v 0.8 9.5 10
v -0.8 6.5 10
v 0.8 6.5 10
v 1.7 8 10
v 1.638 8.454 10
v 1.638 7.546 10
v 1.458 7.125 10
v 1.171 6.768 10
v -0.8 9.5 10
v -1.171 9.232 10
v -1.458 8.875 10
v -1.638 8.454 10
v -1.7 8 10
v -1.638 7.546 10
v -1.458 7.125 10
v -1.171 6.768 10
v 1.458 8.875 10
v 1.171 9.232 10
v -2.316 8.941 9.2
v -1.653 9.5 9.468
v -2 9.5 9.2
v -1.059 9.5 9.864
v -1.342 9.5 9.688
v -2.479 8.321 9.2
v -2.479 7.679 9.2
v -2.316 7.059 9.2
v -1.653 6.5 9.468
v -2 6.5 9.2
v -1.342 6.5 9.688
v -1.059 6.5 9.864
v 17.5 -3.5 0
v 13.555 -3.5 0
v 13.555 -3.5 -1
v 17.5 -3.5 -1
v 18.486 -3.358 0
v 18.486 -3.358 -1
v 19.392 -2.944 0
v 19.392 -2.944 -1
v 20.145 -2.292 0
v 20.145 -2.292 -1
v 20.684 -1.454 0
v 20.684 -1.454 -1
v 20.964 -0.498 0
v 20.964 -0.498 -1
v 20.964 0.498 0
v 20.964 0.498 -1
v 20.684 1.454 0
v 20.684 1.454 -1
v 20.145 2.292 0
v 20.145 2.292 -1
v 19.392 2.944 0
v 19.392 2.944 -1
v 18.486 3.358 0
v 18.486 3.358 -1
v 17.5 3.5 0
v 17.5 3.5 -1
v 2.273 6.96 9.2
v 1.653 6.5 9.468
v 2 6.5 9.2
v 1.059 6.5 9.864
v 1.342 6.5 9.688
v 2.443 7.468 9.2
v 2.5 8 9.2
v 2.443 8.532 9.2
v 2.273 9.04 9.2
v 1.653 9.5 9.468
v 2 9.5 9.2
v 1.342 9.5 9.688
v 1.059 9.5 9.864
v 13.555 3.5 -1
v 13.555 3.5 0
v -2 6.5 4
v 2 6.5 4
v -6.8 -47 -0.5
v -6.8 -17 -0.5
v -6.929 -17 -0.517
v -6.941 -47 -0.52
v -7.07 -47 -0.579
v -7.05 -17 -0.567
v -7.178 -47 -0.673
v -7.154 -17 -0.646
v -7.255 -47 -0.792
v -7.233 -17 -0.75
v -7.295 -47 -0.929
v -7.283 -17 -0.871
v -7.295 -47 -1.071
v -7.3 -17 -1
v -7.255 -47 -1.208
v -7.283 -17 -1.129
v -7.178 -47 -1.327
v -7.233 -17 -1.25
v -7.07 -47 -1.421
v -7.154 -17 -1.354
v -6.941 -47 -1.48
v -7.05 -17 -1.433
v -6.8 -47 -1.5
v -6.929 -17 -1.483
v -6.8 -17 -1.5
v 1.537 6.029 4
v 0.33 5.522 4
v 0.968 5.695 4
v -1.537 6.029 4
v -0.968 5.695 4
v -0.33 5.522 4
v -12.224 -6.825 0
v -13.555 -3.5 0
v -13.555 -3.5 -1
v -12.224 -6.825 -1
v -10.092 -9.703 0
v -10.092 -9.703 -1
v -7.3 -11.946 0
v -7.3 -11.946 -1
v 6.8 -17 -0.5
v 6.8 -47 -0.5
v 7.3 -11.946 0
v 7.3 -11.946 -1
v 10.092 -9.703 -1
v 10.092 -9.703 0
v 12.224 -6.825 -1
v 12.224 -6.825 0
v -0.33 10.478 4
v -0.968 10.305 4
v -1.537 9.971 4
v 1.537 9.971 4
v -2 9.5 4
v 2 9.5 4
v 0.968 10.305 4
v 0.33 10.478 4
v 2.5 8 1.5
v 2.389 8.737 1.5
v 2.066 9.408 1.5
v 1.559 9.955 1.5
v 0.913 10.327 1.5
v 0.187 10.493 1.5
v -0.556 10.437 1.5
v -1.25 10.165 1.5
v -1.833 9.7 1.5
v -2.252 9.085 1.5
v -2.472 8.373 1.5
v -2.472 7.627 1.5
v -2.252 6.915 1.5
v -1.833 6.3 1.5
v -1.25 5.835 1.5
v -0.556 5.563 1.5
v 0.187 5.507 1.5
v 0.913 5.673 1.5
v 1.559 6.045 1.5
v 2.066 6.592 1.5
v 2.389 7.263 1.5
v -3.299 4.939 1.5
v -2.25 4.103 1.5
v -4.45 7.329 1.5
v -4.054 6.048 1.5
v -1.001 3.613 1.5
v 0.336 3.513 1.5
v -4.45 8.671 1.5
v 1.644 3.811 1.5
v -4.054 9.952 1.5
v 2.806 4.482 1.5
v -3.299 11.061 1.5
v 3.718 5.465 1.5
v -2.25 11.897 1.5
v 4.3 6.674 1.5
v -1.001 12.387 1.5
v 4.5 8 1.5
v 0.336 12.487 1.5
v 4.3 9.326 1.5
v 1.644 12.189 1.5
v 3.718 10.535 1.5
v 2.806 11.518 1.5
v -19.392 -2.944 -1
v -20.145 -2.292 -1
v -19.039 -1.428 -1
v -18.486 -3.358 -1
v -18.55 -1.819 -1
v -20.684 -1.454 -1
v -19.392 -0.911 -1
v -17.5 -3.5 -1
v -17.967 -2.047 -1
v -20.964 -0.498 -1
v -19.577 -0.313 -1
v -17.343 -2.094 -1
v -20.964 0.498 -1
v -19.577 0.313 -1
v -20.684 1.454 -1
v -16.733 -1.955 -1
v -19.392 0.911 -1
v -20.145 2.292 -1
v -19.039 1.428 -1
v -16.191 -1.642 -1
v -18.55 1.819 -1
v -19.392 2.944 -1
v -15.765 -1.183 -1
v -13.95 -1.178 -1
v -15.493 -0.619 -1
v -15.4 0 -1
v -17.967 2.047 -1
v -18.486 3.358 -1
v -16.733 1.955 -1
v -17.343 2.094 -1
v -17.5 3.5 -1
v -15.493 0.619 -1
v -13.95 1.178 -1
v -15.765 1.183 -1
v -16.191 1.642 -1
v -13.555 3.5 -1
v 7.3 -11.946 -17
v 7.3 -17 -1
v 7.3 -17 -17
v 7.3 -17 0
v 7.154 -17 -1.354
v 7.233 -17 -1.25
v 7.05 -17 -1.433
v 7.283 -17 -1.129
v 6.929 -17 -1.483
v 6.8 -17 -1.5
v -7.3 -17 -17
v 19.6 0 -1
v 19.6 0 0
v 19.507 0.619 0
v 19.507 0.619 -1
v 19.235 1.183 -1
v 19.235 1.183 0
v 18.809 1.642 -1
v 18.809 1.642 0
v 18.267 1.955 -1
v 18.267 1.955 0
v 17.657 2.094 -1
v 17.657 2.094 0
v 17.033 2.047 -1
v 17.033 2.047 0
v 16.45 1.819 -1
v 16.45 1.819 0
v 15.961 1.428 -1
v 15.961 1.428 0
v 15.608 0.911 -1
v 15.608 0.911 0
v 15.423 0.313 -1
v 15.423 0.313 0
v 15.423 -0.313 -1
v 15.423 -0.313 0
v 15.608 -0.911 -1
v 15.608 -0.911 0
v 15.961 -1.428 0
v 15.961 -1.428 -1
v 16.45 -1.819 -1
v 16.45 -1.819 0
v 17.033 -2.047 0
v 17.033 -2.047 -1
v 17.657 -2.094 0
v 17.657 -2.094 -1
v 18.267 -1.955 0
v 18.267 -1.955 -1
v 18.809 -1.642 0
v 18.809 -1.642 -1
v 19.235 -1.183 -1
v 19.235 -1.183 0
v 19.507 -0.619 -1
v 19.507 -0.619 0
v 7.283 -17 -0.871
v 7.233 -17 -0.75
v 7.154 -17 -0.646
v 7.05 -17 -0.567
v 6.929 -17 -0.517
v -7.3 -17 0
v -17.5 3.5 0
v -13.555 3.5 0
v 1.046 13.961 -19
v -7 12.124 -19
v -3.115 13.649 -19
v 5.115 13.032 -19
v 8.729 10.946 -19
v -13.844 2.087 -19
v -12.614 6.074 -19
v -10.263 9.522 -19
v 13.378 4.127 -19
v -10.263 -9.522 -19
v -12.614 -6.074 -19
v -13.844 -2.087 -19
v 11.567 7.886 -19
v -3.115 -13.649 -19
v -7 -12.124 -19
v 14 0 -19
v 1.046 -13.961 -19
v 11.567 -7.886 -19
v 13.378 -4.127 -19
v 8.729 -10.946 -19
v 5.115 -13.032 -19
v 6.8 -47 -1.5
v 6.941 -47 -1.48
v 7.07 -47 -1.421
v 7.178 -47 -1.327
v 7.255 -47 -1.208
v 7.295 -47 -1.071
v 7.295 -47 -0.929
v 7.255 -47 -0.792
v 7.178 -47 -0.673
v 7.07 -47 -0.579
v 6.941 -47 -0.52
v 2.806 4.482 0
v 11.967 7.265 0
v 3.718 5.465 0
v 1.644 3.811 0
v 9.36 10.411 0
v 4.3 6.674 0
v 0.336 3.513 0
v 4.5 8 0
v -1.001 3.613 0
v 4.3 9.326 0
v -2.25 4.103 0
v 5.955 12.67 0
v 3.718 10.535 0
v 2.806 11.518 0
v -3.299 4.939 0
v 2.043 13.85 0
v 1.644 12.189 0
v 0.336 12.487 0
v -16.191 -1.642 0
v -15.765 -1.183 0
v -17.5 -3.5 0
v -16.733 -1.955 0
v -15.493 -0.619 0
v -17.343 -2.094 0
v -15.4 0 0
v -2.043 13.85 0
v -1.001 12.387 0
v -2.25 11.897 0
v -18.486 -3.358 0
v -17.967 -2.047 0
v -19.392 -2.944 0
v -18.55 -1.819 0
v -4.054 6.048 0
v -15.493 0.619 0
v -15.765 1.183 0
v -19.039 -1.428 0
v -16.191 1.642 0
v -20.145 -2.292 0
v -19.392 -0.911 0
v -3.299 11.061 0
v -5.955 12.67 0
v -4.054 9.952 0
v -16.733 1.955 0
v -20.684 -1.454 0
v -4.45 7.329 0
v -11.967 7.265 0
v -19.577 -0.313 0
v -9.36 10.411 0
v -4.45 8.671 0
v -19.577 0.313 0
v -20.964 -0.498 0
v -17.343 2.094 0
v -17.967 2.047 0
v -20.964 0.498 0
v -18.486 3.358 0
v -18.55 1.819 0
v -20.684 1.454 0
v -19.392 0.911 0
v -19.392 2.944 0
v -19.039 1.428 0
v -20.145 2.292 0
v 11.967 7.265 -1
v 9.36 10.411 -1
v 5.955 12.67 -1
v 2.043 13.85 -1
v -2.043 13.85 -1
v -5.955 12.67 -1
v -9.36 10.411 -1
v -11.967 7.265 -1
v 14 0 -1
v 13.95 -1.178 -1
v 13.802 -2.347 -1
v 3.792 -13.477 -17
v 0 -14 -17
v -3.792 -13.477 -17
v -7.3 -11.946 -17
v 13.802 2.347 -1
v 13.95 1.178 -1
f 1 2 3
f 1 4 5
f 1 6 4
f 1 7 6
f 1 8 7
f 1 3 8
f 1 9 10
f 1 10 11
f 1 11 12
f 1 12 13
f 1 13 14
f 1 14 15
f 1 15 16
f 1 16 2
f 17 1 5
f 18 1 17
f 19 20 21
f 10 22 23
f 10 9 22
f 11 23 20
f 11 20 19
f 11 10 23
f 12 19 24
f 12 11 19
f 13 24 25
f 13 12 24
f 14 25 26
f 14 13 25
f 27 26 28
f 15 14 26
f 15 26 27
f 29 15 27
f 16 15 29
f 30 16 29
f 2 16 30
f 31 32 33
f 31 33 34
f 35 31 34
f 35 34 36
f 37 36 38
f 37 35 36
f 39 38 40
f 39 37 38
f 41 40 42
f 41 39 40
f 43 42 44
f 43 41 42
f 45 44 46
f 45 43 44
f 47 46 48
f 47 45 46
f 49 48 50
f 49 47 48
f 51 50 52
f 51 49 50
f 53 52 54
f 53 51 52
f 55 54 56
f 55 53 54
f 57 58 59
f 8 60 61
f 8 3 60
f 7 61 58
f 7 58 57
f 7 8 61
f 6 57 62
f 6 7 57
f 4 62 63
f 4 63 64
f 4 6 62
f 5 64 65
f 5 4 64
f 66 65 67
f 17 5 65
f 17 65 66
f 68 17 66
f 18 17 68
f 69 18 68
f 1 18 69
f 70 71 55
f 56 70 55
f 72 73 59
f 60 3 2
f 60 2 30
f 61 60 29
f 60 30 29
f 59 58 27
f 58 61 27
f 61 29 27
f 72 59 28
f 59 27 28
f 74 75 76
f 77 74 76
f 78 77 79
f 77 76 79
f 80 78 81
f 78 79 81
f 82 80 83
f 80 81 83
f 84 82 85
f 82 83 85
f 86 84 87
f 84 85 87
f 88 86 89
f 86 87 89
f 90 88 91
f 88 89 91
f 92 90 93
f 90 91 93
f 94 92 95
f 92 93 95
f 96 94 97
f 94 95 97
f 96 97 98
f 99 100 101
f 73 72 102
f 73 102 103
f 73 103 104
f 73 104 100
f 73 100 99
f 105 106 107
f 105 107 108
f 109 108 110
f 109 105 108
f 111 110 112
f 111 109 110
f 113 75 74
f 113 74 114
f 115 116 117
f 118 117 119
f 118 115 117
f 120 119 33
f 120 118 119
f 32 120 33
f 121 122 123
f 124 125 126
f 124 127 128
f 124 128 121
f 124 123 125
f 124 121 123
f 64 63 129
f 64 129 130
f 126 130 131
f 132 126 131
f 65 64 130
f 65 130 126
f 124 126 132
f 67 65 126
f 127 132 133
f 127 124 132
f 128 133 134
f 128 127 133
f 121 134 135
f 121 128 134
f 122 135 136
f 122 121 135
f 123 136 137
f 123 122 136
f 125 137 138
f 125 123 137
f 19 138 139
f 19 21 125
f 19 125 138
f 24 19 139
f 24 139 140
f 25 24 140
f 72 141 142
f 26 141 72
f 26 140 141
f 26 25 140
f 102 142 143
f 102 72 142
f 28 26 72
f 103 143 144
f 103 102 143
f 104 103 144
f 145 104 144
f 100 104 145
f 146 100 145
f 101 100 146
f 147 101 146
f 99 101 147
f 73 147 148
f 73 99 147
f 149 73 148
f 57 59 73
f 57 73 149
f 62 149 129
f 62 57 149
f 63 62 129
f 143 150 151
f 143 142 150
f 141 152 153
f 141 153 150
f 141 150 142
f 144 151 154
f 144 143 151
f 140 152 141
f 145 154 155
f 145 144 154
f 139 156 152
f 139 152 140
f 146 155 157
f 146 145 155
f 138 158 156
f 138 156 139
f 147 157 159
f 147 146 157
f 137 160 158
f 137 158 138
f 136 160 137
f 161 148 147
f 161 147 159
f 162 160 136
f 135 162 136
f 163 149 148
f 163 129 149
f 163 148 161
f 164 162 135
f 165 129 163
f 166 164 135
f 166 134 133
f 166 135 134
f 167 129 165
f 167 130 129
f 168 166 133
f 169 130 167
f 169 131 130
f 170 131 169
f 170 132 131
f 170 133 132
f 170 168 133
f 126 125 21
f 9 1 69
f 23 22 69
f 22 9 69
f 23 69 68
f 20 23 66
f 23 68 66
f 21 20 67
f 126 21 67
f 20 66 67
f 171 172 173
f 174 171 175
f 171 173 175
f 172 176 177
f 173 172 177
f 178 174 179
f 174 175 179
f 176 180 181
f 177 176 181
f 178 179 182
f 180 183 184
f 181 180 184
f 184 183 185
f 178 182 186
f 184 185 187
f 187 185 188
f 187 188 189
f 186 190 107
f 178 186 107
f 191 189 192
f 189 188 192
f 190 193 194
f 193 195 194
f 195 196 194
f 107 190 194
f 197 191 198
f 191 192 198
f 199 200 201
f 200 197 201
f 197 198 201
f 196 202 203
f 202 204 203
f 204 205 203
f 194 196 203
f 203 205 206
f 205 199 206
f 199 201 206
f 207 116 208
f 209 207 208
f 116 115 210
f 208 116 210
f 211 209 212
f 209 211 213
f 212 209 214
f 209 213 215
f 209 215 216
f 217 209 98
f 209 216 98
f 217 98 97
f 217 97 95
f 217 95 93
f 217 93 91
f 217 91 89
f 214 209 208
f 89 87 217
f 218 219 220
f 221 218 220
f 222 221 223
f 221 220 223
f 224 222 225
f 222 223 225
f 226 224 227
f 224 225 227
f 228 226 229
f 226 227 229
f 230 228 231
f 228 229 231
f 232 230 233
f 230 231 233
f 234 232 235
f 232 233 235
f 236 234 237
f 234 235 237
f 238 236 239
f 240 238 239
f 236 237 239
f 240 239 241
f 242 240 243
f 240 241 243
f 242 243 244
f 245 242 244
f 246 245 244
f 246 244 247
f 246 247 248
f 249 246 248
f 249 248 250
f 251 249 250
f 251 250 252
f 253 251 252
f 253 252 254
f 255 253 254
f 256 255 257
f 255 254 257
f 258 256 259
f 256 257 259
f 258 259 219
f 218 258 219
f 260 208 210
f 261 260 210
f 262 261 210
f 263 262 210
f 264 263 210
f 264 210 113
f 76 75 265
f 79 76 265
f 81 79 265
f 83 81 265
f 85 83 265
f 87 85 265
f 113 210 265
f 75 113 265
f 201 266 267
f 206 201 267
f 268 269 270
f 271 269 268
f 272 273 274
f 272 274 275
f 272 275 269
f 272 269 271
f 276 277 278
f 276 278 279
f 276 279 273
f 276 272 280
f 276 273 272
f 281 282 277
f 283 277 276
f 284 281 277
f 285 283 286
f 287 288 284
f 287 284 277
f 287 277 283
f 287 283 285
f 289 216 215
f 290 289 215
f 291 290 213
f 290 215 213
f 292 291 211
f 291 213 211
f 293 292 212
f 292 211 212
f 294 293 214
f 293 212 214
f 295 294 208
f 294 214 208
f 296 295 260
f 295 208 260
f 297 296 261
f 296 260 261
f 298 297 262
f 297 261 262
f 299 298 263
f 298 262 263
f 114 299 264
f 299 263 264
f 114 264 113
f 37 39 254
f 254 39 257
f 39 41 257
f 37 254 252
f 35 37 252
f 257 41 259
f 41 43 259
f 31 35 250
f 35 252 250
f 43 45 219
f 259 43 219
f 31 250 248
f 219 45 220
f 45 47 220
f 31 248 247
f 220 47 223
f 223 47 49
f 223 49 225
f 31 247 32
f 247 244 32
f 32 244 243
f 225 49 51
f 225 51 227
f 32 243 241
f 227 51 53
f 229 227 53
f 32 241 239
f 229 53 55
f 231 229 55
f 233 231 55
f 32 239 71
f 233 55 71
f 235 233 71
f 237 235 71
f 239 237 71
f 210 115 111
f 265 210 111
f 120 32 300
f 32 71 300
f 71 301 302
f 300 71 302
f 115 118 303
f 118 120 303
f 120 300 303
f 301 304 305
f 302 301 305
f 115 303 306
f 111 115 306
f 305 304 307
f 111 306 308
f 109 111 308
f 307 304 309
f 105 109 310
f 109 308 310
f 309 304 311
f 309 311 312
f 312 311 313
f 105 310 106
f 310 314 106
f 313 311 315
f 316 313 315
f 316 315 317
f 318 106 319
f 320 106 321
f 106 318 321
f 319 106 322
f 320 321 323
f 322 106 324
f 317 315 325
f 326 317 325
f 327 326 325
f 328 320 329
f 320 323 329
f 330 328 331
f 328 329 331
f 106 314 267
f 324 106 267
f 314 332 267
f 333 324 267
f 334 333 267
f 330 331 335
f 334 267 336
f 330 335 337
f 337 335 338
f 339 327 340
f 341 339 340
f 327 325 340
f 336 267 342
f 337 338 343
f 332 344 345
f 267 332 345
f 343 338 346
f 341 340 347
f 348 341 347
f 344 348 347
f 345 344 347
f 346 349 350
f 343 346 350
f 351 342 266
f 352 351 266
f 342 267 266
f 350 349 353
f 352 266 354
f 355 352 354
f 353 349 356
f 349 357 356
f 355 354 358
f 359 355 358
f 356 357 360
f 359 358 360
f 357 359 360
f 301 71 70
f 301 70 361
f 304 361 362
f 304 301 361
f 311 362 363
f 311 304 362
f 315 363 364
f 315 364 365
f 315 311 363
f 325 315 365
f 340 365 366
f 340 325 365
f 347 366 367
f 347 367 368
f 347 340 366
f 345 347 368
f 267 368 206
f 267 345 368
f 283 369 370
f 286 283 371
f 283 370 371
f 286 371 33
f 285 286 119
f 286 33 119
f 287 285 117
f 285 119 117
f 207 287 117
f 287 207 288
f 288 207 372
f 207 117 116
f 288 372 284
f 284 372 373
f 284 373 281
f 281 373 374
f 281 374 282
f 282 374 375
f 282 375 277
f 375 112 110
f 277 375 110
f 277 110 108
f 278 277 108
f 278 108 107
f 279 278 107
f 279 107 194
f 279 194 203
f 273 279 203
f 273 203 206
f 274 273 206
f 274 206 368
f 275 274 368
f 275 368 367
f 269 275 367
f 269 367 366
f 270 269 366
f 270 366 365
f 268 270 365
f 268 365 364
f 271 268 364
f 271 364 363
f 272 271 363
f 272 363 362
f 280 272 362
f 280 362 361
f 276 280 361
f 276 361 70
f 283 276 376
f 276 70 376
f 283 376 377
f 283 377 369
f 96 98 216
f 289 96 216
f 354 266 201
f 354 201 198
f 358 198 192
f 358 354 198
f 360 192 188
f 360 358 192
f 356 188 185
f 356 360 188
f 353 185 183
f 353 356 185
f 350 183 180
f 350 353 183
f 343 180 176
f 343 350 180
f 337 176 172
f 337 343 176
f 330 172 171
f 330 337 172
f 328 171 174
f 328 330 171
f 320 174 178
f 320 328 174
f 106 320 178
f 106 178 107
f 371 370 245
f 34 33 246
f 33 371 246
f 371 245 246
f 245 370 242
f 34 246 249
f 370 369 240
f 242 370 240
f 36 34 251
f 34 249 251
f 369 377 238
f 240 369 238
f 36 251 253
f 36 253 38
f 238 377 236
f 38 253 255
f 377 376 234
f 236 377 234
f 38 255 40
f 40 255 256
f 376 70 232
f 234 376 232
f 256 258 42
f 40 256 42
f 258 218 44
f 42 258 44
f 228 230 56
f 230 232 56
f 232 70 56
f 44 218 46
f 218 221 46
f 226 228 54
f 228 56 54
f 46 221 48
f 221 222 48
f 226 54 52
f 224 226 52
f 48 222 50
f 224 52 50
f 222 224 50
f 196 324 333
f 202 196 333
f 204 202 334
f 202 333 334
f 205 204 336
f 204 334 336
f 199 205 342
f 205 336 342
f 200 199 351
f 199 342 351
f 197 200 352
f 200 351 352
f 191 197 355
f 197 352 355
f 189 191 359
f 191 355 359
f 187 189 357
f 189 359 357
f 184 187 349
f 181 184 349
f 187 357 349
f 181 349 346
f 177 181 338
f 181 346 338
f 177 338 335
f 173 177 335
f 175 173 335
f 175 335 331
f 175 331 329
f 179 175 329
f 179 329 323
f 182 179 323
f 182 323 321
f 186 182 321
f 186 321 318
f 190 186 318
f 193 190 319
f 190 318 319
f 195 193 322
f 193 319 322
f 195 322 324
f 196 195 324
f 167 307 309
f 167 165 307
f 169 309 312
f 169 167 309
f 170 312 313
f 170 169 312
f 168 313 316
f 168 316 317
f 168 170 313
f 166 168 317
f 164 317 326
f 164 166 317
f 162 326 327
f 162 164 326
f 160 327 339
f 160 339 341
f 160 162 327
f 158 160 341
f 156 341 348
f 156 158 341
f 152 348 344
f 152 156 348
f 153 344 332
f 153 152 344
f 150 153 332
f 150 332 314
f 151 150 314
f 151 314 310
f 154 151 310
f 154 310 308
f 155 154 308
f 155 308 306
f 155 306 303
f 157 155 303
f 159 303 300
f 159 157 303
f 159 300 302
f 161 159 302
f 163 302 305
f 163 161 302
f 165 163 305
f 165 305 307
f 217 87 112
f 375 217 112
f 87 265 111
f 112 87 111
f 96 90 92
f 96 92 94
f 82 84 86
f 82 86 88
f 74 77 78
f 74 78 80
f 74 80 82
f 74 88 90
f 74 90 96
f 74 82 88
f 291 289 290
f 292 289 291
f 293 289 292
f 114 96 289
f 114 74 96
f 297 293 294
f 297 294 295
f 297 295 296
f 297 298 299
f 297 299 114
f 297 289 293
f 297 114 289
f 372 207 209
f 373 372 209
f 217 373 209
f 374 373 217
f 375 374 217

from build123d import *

# Parameters (mm, degrees)
SKETCH_R     = 2.1
PAD_DEPTH    = 1
SKETCH001_R  = 14
PAD001_DEPTH = 18
POCKET_DEPTH = 6
PAD002_DEPTH = 17
PAD003_DEPTH = 30


with BuildPart() as part:
    # Sketch → Pad (new body)
    with BuildSketch(Plane.XY):
        with BuildLine():
            ThreePointArc((13.555442, 3.5), (0, 14), (-13.555442, 3.5))
            Line((-17.5, 3.5), (-13.555442, 3.5))
            ThreePointArc((-17.5, 3.5), (-21, 0), (-17.5, -3.5))
            Line((-17.5, -3.5), (-13.555442, -3.5))
            ThreePointArc((-13.555442, -3.5), (0, -14), (13.555442, -3.5))
            Line((13.555442, -3.5), (17.5, -3.5))
            ThreePointArc((17.5, -3.5), (21, 0), (17.5, 3.5))
            Line((13.555442, 3.5), (17.5, 3.5))
        make_face()
        with Locations((-17.5, 0)):
            Circle(SKETCH_R, mode=Mode.SUBTRACT)
        with Locations((17.5, 0)):
            Circle(SKETCH_R, mode=Mode.SUBTRACT)
    extrude(amount=-PAD_DEPTH)

    # Sketch001 (on Face12 of Pad) → Pad001 (join)
    with BuildSketch(Plane(origin=(0, 0, -1), x_dir=(1, 0, 0), z_dir=(0, 0, -1))):
        Circle(SKETCH001_R)
    extrude(amount=PAD001_DEPTH)

    # Sketch002 → Revolution (revolve)
    with BuildSketch(Plane.XZ.offset(-8)):
        Polygon((0, 0), (4.5, 0), (4.5, 1.5), (2.5, 1.5), (2.5, 9.2), (1.7, 10), (0, 10), align=None)
    revolve(axis=Axis((0, 8, 0), (0, 0, 1)))

    # Sketch003 (on Face20 of Revolution) → Pocket (cut)
    with BuildSketch(Plane.XY.offset(10)):
        with BuildLine():
            ThreePointArc((2.598076, 9.5), (0, 11), (-2.598076, 9.5))
            Line((-2.598076, 9.5), (2.598076, 9.5))
        make_face()
        with BuildLine():
            Line((2.598076, 6.5), (-2.598076, 6.5))
            ThreePointArc((-2.598076, 6.5), (0, 5), (2.598076, 6.5))
        make_face()
    extrude(amount=-POCKET_DEPTH, mode=Mode.SUBTRACT)

    # Sketch004 → Pad002 (join)
    with BuildSketch(Plane.XY):
        with BuildLine():
            ThreePointArc((-7.3, -11.946129), (0, -14), (7.3, -11.946129))
            Line((7.3, -11.946129), (7.3, -17))
            Line((7.3, -17), (-7.3, -17))
            Line((-7.3, -17), (-7.3, -11.946129))
        make_face()
    extrude(amount=-PAD002_DEPTH)

    # Sketch005 (on Face22 of Pad002) → Pad003 (join)
    with BuildSketch(Plane.XZ.offset(17)):
        with BuildLine():
            ThreePointArc((-6.8, -0.5), (-7.3, -1), (-6.8, -1.5))
            Line((-6.8, -1.5), (6.8, -1.5))
            ThreePointArc((6.8, -1.5), (7.3, -1), (6.8, -0.5))
            Line((-6.8, -0.5), (6.8, -0.5))
        make_face()
    extrude(amount=PAD003_DEPTH)


solid = part.part
